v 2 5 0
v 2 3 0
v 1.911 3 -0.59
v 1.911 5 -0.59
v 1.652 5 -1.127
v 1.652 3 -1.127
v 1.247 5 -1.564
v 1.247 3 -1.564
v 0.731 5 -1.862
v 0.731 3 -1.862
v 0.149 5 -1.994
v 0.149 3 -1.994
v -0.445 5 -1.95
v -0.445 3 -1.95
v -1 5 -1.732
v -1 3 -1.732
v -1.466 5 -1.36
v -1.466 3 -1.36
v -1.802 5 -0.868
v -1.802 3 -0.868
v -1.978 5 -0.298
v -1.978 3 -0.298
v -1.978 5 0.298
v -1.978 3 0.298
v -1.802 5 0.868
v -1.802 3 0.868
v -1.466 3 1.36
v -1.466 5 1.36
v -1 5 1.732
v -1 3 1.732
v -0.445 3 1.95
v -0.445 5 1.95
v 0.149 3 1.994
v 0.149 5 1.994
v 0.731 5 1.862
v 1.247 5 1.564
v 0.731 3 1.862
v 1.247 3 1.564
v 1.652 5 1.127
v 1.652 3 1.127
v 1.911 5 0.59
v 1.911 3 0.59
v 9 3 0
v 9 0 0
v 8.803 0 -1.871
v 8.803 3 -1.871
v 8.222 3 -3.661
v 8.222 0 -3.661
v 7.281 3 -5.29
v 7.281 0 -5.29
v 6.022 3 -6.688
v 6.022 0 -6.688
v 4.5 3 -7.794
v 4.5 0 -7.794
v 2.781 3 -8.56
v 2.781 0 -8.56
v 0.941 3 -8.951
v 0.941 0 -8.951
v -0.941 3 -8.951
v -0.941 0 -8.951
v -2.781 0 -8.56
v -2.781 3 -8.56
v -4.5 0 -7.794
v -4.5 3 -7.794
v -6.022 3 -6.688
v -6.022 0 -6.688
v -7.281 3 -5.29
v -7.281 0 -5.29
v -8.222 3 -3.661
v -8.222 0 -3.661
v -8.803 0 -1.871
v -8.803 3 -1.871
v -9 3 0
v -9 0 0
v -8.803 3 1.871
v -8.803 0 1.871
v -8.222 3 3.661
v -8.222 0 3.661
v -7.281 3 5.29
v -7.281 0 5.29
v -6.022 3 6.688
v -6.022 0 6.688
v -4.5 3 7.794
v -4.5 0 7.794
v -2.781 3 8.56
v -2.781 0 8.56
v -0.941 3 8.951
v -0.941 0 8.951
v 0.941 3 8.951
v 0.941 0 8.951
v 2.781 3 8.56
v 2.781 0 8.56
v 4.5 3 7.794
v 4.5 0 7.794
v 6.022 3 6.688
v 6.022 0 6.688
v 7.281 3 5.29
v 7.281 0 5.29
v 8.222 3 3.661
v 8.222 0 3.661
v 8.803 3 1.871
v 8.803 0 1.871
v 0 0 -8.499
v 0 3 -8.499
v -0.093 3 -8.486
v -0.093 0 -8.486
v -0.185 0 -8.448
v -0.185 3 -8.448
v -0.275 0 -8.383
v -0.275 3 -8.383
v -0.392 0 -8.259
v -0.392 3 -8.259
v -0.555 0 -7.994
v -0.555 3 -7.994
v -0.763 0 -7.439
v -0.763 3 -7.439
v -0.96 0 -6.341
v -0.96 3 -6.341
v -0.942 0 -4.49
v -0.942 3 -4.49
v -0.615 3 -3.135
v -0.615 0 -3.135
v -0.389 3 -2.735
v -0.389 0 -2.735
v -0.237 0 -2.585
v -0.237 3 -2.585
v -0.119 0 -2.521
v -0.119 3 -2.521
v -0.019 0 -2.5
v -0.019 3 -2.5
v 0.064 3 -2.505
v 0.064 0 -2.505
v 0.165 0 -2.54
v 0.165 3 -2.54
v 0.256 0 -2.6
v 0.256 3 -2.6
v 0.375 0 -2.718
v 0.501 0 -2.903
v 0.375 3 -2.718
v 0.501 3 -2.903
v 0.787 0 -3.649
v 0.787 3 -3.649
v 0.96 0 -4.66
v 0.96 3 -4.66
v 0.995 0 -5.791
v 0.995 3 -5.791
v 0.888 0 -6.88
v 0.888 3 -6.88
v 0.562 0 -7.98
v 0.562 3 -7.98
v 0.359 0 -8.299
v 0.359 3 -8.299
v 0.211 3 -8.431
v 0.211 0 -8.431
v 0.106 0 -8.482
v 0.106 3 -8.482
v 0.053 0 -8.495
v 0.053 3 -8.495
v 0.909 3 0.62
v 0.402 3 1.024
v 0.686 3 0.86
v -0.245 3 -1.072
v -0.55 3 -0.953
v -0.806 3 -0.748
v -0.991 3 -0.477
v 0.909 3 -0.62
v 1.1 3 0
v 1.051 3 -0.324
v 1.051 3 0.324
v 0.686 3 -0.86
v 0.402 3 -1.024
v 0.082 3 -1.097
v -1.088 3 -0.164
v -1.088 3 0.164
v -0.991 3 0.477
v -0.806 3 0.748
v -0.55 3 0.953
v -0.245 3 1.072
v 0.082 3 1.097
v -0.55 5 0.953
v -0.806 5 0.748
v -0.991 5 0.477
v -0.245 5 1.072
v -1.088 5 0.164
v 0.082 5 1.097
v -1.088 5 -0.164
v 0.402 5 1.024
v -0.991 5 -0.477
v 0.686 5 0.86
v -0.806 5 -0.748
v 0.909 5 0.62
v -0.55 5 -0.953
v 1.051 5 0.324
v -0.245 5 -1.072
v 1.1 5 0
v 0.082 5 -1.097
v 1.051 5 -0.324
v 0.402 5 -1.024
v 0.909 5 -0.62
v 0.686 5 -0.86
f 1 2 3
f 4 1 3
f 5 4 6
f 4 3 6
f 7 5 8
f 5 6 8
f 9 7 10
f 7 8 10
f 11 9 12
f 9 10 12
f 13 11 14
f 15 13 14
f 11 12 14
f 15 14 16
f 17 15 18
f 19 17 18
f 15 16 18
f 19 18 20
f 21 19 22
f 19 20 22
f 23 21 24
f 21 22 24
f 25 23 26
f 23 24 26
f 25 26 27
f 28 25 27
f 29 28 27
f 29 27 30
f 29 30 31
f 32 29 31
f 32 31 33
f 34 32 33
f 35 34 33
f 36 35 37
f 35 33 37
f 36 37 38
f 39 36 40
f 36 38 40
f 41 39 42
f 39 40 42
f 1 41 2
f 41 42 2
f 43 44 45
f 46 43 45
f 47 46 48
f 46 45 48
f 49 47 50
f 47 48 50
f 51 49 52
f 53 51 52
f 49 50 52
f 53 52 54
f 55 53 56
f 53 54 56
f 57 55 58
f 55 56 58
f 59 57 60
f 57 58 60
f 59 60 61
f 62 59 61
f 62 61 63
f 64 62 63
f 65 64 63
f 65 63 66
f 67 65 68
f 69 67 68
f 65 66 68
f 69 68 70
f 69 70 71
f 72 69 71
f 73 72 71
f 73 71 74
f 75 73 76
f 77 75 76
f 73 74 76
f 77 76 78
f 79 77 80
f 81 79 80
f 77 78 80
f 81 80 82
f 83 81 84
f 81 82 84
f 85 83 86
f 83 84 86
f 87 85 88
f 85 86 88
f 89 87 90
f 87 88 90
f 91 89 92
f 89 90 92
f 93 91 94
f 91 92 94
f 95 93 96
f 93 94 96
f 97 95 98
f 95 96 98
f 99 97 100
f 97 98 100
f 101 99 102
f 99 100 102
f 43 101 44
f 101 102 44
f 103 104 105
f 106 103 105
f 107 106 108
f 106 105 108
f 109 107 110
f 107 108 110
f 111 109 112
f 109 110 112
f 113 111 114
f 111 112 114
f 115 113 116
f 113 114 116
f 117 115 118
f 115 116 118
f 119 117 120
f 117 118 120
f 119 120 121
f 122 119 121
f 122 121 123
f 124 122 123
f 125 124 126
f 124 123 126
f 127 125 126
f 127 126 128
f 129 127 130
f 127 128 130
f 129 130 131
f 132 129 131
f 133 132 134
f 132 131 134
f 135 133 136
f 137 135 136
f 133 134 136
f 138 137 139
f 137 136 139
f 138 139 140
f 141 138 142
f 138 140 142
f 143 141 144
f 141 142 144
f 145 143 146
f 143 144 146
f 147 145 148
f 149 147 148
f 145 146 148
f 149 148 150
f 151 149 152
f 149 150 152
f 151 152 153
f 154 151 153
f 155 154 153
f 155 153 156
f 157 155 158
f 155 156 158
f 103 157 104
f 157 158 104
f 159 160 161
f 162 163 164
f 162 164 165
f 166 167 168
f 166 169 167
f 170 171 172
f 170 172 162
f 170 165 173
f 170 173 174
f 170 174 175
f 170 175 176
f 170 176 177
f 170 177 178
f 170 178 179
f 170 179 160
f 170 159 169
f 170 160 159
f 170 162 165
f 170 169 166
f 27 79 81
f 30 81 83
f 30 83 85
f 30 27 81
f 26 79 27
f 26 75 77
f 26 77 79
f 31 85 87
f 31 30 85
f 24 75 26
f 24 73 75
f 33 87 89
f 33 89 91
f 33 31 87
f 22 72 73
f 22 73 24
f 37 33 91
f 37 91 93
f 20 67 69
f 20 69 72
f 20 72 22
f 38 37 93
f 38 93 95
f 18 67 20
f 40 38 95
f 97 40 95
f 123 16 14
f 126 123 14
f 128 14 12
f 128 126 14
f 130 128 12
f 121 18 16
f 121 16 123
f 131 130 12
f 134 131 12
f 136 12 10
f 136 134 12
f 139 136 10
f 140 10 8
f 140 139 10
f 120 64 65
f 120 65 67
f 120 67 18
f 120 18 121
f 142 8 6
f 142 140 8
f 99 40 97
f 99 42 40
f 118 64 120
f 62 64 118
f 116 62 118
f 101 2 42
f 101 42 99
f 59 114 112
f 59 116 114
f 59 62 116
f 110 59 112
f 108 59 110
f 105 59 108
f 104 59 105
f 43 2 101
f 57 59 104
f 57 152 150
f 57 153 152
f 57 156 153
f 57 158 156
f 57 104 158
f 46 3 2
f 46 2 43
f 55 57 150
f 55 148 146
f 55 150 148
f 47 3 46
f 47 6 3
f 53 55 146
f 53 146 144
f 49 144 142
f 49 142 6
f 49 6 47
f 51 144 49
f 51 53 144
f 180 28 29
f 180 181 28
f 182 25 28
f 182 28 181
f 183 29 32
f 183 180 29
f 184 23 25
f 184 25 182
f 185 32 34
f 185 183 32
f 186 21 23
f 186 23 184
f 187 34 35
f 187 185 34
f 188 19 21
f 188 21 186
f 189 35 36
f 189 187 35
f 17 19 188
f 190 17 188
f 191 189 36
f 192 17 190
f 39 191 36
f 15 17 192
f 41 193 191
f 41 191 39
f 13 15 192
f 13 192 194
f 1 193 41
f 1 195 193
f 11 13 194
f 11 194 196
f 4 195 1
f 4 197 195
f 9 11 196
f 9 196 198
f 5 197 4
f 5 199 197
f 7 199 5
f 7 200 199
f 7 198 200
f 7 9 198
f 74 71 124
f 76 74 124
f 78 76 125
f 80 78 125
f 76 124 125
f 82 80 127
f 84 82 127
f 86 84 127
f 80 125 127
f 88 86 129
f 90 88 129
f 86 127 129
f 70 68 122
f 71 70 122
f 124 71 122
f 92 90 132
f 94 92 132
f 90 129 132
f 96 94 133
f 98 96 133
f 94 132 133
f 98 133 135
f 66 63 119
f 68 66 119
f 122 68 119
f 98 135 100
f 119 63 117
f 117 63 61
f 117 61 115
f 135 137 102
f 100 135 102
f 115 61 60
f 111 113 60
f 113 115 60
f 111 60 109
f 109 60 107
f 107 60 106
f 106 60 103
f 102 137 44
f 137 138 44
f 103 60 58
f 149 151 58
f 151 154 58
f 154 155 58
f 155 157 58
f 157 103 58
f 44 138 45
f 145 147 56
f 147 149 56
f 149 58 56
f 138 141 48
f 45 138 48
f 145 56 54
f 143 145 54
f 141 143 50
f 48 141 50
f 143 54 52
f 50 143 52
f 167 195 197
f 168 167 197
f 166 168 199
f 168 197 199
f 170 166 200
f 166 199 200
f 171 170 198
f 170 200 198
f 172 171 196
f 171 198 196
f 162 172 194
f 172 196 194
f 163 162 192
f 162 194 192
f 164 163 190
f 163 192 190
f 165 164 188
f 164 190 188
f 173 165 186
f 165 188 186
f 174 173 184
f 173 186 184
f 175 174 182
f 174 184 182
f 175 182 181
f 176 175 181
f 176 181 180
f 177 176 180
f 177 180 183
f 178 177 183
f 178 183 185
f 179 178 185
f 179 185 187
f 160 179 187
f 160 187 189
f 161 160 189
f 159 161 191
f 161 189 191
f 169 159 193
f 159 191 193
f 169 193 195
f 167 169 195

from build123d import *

# Parameters (mm, degrees)
SKETCH1_R           = 9
BOSS_EXTRUDE1_DEPTH = 3
SKETCH2_R           = 2
BOSS_EXTRUDE2_DEPTH = 2
SKETCH3_R           = 1.1
CUT_EXTRUDE1_DEPTH  = 2
SKETCH4_RX          = 3
SKETCH4_RY          = 1
CUT_EXTRUDE2_DEPTH  = 3


with BuildPart() as part:
    # Sketch1 → Boss-Extrude1 (new body)
    with BuildSketch(Plane(origin=(0, 0, 0), x_dir=(1, 0, 0), z_dir=(0, 1, 0))):
        Circle(SKETCH1_R)
    extrude(amount=BOSS_EXTRUDE1_DEPTH)

    # Sketch2 → Boss-Extrude2 (add)
    with BuildSketch(Plane(origin=(0, 3, 0), x_dir=(1, 0, 0), z_dir=(0, 1, 0))):
        Circle(SKETCH2_R)
    extrude(amount=BOSS_EXTRUDE2_DEPTH)

    # Sketch3 → Cut-Extrude1 (cut)
    with BuildSketch(Plane(origin=(0, 5, 0), x_dir=(1, 0, 0), z_dir=(0, 1, 0))):
        Circle(SKETCH3_R)
    extrude(amount=-CUT_EXTRUDE1_DEPTH, mode=Mode.SUBTRACT)

    # Sketch4 → Cut-Extrude2 (cut)
    with BuildSketch(Plane(origin=(0, 3, 0), x_dir=(1, 0, 0), z_dir=(0, 1, 0))):
        with Locations(Location((0, 5.49925853), (0, 0, 90))):
            Ellipse(SKETCH4_RX, SKETCH4_RY)
    extrude(amount=-CUT_EXTRUDE2_DEPTH, mode=Mode.SUBTRACT)


solid = part.part
